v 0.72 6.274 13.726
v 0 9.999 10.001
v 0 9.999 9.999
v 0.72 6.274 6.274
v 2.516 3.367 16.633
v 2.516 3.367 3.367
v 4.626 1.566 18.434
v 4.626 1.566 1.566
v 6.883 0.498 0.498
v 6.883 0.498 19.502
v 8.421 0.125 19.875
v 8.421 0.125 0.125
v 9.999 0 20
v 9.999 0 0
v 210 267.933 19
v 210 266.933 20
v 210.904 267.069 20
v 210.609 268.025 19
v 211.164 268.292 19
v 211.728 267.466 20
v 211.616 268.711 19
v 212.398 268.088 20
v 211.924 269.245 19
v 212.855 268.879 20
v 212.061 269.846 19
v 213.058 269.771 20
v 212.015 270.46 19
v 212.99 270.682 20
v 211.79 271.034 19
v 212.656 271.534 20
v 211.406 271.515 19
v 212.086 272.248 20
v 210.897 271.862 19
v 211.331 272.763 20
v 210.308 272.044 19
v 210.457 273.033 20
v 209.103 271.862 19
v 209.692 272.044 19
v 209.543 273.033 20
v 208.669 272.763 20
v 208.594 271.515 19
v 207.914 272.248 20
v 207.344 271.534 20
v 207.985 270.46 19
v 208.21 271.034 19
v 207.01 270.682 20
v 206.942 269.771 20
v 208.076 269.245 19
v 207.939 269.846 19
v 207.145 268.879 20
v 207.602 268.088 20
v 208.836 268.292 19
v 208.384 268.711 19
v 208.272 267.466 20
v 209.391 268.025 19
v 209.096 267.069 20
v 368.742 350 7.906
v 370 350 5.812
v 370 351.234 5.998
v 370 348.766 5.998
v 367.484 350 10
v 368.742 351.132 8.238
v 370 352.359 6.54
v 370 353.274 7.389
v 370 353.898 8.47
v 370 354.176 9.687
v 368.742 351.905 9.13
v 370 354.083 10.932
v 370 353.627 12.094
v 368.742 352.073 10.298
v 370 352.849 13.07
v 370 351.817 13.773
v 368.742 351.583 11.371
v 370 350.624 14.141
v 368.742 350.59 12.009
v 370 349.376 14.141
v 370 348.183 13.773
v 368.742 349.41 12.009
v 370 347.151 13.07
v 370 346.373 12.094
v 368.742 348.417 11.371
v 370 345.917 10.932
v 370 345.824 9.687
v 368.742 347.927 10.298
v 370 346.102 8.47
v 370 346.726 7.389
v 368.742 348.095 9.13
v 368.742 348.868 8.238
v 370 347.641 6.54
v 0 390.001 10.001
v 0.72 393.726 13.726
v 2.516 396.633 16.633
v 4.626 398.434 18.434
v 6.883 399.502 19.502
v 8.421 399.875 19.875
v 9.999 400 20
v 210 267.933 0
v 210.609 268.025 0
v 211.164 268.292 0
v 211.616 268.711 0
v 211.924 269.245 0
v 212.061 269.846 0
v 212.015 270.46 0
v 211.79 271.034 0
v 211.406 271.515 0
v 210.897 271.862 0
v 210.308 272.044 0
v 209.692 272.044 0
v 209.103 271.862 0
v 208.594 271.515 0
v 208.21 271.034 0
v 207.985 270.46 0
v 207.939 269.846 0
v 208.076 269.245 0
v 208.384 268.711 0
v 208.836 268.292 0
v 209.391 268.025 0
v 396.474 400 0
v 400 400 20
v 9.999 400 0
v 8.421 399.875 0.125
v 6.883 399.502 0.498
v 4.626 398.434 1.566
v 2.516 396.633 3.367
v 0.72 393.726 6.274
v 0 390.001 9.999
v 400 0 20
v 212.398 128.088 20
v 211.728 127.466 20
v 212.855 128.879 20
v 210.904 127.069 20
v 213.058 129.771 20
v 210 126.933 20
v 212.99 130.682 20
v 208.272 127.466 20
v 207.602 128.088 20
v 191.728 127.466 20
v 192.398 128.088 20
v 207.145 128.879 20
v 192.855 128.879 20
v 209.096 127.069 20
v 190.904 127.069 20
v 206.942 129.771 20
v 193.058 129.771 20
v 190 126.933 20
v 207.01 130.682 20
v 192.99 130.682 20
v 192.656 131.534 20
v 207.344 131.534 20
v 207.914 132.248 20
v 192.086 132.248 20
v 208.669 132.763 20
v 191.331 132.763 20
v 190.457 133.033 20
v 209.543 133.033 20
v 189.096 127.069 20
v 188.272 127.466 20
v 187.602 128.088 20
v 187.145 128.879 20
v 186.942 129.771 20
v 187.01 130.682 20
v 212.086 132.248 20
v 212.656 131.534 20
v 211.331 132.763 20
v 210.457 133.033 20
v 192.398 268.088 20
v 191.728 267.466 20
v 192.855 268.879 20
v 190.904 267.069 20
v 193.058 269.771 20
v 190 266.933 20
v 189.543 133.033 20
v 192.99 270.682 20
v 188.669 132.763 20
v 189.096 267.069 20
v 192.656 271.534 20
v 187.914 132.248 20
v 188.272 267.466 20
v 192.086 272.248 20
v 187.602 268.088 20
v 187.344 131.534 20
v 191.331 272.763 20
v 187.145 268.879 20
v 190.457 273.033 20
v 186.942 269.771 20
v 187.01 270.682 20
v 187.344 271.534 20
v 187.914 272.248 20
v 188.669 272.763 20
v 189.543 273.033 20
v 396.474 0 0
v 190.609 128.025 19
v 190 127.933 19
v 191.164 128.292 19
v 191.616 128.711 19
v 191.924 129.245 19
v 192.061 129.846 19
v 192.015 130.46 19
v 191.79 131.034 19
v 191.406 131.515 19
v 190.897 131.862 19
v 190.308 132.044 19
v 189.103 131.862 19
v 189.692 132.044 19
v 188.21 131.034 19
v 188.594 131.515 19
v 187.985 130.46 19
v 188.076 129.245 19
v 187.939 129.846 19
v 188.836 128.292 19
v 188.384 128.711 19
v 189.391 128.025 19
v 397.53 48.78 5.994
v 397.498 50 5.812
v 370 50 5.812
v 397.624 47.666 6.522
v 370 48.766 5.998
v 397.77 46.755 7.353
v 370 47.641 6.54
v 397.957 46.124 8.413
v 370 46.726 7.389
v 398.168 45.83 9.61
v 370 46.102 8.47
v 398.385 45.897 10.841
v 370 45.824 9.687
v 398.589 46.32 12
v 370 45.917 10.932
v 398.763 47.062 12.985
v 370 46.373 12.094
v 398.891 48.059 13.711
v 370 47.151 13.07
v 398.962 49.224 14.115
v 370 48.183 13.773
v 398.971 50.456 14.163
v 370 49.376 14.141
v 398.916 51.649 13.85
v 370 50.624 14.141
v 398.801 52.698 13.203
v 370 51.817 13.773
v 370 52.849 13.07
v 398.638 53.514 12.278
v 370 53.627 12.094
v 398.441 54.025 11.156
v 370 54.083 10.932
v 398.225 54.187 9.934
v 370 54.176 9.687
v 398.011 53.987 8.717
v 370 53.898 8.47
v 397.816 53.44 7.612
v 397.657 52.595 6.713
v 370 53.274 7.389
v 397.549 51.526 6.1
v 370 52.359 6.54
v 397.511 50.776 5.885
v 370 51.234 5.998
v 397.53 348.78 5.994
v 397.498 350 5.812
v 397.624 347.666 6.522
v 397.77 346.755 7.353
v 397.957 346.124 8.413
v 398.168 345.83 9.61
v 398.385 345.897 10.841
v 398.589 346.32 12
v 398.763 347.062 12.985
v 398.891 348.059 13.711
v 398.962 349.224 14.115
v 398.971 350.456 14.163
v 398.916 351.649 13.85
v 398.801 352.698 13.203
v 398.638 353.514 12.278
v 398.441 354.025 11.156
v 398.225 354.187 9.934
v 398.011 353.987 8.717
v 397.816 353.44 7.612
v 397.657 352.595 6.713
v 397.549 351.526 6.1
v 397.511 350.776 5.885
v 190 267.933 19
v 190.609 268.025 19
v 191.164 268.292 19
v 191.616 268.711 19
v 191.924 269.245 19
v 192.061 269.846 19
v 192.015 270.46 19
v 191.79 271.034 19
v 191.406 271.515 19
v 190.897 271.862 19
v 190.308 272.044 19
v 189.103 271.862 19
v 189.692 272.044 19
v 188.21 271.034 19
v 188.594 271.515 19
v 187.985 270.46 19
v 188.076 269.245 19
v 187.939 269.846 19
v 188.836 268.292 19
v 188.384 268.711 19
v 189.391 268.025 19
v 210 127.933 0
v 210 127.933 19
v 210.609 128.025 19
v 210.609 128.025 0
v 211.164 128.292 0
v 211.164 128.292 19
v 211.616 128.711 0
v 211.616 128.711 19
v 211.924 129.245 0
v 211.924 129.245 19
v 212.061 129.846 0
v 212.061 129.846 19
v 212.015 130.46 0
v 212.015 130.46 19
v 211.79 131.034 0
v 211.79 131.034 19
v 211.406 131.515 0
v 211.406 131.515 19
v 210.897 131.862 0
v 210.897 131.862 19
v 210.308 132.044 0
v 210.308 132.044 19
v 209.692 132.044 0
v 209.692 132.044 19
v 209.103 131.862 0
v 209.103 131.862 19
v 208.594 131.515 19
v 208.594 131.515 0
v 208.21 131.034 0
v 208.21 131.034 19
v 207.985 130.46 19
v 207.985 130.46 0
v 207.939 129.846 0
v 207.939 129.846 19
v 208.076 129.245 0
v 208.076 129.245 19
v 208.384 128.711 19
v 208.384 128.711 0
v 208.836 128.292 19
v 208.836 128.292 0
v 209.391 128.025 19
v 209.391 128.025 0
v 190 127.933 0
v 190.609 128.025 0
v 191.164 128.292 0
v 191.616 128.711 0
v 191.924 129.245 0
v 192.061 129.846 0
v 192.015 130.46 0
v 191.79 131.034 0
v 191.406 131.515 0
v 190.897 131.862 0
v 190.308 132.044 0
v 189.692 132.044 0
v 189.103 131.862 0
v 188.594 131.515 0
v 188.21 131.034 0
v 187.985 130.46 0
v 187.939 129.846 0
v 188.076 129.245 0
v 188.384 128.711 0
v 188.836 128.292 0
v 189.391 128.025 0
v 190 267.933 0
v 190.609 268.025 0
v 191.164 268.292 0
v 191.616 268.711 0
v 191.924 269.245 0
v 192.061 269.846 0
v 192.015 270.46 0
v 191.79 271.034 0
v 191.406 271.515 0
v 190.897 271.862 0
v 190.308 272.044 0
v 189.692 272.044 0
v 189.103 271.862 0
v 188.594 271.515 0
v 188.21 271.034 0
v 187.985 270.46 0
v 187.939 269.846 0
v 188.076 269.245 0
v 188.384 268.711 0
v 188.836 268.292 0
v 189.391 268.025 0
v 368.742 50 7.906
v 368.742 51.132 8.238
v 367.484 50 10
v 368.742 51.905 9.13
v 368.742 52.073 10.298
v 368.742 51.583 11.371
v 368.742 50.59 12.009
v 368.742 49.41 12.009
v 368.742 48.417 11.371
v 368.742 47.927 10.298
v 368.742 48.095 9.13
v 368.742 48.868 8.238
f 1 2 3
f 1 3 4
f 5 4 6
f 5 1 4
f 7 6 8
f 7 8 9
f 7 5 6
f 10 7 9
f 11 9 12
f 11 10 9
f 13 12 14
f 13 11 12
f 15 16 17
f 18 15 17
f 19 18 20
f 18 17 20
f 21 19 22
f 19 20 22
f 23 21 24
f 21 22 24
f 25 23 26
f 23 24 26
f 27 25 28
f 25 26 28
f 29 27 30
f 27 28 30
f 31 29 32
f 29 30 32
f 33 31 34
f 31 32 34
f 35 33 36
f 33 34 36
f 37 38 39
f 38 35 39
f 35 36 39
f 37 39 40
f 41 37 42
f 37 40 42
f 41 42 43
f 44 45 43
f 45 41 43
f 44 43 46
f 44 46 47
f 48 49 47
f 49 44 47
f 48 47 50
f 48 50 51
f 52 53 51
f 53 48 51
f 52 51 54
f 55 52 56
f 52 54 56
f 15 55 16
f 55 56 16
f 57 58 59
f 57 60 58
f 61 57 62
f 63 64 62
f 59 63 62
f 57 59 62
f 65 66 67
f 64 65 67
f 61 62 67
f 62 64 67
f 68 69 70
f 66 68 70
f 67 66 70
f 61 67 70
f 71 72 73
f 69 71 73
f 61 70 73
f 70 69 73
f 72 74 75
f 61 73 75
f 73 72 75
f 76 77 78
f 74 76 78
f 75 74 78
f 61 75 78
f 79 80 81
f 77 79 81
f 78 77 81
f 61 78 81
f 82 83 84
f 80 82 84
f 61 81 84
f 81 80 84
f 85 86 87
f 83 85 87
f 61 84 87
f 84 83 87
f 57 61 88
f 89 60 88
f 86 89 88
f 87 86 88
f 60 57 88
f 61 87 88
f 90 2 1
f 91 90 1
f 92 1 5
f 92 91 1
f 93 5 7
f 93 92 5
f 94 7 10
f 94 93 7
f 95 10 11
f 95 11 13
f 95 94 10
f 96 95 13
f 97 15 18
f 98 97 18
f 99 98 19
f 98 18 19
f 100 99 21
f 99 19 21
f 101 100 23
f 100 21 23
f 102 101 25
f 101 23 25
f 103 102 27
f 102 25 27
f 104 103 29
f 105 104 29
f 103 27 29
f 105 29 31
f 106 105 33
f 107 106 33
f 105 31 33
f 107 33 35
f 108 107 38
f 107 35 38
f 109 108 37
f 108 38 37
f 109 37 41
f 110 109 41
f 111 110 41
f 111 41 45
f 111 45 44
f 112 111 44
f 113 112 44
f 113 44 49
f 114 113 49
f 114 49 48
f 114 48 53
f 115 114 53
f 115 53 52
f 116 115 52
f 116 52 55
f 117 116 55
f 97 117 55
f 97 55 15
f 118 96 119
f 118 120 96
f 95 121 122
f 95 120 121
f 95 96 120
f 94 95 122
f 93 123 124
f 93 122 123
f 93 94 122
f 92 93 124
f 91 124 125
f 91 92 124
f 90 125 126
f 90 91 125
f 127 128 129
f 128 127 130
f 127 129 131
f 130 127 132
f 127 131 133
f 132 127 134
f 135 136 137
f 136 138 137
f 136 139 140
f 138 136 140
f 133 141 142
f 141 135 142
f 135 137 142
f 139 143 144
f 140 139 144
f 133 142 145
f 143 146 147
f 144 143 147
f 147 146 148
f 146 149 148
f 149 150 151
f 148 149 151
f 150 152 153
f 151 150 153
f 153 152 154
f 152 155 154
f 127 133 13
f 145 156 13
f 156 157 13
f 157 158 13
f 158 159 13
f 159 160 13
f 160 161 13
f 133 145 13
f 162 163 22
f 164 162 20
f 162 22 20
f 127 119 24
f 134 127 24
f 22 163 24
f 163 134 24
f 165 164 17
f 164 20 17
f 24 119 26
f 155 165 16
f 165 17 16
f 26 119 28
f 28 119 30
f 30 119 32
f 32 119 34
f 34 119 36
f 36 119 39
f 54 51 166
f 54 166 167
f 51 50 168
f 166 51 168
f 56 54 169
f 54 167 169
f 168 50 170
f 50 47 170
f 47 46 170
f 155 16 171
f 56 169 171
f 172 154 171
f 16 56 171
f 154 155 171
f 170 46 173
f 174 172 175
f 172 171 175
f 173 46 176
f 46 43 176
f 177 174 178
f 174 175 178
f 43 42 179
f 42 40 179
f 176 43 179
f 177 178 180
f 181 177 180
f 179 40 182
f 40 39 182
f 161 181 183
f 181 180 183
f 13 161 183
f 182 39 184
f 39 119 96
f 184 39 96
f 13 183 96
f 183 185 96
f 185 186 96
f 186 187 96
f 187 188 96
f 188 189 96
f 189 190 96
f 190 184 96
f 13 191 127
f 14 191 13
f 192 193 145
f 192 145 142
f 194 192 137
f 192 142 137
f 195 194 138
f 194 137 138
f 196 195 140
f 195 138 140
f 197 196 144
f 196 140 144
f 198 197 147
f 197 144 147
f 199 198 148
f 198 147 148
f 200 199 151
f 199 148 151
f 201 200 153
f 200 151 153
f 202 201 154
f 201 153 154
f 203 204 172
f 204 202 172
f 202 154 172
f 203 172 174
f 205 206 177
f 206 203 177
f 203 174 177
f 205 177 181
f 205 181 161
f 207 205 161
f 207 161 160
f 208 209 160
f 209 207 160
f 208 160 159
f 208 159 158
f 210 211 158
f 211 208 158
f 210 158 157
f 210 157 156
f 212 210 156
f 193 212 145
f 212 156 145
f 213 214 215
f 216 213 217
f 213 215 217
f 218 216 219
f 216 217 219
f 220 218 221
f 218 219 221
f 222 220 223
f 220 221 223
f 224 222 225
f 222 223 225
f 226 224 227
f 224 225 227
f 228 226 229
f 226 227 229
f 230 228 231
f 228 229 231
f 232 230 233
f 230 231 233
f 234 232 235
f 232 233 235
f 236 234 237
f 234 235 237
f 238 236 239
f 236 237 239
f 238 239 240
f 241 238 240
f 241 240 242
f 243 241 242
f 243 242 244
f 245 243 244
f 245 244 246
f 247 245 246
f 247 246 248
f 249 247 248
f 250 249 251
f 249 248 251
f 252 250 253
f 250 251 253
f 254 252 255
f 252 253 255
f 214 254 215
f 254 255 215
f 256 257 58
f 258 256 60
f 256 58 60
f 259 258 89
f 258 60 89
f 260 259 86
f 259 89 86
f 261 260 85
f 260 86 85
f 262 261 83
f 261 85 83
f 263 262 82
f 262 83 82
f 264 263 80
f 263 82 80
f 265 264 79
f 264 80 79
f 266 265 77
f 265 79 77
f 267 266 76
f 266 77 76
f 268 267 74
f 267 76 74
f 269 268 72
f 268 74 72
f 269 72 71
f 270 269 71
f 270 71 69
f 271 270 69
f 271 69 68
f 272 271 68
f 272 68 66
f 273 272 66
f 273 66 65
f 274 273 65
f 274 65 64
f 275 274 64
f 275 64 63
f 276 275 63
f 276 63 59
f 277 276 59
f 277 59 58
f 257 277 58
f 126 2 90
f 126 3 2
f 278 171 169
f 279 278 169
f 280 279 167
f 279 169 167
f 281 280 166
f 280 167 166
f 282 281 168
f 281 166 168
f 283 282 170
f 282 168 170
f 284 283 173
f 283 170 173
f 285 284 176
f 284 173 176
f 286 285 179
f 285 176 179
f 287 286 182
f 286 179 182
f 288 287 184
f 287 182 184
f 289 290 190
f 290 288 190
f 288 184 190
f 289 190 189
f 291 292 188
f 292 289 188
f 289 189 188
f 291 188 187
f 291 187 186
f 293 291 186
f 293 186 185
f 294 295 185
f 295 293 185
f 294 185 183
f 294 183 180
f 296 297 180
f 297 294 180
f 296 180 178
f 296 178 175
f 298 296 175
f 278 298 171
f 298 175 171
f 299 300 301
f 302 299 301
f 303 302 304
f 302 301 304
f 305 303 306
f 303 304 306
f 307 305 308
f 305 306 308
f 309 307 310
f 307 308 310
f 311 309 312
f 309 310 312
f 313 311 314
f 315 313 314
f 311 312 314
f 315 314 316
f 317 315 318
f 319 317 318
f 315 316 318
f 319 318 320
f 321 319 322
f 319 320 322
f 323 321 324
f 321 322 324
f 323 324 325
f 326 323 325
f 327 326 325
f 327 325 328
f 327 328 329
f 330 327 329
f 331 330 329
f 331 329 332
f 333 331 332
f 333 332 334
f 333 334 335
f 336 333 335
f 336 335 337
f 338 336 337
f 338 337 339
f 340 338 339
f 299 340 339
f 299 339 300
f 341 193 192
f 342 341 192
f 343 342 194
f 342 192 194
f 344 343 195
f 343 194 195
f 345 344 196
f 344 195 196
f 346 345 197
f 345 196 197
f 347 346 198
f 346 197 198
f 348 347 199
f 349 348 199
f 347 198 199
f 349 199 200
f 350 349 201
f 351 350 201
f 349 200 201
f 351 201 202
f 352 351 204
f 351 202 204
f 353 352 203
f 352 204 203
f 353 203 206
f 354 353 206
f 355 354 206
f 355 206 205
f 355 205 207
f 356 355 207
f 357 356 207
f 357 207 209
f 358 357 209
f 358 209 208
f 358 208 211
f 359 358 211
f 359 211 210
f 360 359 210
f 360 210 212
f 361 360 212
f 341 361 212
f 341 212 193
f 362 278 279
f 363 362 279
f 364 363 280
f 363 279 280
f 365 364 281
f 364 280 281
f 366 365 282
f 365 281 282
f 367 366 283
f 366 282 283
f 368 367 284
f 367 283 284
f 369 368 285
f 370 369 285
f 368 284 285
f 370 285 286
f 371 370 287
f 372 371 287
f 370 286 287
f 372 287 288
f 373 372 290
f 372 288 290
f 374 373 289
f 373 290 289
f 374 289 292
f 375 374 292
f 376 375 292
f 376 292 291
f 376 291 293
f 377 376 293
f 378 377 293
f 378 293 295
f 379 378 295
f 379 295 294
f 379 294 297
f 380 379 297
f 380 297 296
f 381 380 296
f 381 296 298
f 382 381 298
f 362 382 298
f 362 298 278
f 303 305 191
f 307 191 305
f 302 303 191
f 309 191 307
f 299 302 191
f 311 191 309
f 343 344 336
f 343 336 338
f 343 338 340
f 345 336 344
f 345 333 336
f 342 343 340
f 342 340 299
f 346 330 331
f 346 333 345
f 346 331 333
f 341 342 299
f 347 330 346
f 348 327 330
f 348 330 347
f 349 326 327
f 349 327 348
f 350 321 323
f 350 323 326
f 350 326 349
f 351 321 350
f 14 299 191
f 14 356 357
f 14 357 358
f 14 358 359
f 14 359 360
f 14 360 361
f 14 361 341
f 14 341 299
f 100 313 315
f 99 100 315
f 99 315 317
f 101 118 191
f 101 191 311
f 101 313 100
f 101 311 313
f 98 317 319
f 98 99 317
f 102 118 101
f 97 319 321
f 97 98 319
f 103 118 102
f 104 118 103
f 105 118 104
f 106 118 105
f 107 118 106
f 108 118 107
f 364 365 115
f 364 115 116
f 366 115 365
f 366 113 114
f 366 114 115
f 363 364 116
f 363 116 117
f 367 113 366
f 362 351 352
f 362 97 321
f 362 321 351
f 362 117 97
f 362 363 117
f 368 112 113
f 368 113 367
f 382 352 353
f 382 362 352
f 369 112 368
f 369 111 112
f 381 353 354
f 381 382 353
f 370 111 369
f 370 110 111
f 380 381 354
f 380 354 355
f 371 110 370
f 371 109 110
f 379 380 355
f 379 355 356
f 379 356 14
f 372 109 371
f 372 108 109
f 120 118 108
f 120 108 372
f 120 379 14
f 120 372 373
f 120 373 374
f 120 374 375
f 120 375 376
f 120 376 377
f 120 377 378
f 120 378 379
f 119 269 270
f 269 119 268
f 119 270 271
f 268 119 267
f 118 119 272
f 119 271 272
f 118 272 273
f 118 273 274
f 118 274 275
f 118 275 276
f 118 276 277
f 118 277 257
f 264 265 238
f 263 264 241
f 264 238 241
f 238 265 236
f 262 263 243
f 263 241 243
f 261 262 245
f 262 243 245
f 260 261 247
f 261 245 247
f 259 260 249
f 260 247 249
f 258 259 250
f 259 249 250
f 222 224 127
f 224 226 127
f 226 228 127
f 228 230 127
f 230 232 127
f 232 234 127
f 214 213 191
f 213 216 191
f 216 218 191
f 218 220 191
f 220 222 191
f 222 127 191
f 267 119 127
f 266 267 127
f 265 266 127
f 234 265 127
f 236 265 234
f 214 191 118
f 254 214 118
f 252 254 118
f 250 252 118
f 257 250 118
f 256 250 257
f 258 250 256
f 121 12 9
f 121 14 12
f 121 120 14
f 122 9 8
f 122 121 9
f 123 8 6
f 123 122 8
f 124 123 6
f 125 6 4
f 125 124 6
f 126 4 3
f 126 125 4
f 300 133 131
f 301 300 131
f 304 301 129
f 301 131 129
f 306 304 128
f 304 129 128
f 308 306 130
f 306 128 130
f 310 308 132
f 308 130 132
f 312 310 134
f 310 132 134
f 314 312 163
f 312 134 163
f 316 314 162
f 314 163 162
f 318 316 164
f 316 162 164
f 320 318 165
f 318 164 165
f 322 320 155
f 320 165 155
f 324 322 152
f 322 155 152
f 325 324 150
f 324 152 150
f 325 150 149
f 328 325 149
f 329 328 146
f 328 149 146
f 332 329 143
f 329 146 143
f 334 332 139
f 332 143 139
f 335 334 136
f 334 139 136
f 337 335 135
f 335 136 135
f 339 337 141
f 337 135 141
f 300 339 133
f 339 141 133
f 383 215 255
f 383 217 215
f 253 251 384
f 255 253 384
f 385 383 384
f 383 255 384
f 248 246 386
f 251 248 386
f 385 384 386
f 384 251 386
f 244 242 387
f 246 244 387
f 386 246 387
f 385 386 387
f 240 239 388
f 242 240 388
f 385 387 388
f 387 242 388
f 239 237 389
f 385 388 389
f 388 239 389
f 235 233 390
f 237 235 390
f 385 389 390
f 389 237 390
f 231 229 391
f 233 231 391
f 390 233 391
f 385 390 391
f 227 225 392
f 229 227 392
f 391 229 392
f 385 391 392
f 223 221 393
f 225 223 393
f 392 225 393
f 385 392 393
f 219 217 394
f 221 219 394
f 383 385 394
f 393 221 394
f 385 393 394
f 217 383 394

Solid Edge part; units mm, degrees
sketch "Sketch1" plane through (0, 0, 0) normal (0, 0, 1) x (1, 0, 0)
  line L0 (400, 0) -> (0, 0)
  line L1 (0, 0) -> (0, 400)
  line L2 (0, 400) -> (400, 400)
  line L3 (400, 400) -> (400, 0)
extrude "Protrusion1" add sketch "Sketch1" along normal blind 20
fillet "Verrundung_10" radius 10 4 edges at (0, 200, 20) (0, 200, 0) (0, 400, 10) (0, 0, 10)
sketch "Sketch2" plane through (205, 0, 10) normal (0, -1, 0) x (1, 0, 0)
  line L0 (195, -10) -> (195, 10)
  line L1 (195, 10) -> (191.4735, -10)
  line L2 (191.4735, -10) -> (195, -10)
extrude "Extrusionsausschnitt_1" cut sketch "Sketch2" against normal blind 400
hole "Bohrung_1" at (400, 350, 10) direction (-1, 0, 0) diameter 8.376 depth 30 tip angle 118
hole "Hole1" at (400, 50, 10) direction (-1, 0, 0) diameter 8.376 depth 30 tip angle 118
hole "Bohrung_3" at (190, 130, 20) direction (0, 0, -1) diameter 4.134 end through all start chamfer 1 start chamfer angle 45
hole "Hole2" at (210, 130, 20) direction (0, 0, -1) diameter 4.134 end through all start chamfer 1 start chamfer angle 45
hole "Hole3" at (210, 270, 20) direction (0, 0, -1) diameter 4.134 end through all start chamfer 1 start chamfer angle 45
hole "Hole4" at (190, 270, 20) direction (0, 0, -1) diameter 4.134 end through all start chamfer 1 start chamfer angle 45
